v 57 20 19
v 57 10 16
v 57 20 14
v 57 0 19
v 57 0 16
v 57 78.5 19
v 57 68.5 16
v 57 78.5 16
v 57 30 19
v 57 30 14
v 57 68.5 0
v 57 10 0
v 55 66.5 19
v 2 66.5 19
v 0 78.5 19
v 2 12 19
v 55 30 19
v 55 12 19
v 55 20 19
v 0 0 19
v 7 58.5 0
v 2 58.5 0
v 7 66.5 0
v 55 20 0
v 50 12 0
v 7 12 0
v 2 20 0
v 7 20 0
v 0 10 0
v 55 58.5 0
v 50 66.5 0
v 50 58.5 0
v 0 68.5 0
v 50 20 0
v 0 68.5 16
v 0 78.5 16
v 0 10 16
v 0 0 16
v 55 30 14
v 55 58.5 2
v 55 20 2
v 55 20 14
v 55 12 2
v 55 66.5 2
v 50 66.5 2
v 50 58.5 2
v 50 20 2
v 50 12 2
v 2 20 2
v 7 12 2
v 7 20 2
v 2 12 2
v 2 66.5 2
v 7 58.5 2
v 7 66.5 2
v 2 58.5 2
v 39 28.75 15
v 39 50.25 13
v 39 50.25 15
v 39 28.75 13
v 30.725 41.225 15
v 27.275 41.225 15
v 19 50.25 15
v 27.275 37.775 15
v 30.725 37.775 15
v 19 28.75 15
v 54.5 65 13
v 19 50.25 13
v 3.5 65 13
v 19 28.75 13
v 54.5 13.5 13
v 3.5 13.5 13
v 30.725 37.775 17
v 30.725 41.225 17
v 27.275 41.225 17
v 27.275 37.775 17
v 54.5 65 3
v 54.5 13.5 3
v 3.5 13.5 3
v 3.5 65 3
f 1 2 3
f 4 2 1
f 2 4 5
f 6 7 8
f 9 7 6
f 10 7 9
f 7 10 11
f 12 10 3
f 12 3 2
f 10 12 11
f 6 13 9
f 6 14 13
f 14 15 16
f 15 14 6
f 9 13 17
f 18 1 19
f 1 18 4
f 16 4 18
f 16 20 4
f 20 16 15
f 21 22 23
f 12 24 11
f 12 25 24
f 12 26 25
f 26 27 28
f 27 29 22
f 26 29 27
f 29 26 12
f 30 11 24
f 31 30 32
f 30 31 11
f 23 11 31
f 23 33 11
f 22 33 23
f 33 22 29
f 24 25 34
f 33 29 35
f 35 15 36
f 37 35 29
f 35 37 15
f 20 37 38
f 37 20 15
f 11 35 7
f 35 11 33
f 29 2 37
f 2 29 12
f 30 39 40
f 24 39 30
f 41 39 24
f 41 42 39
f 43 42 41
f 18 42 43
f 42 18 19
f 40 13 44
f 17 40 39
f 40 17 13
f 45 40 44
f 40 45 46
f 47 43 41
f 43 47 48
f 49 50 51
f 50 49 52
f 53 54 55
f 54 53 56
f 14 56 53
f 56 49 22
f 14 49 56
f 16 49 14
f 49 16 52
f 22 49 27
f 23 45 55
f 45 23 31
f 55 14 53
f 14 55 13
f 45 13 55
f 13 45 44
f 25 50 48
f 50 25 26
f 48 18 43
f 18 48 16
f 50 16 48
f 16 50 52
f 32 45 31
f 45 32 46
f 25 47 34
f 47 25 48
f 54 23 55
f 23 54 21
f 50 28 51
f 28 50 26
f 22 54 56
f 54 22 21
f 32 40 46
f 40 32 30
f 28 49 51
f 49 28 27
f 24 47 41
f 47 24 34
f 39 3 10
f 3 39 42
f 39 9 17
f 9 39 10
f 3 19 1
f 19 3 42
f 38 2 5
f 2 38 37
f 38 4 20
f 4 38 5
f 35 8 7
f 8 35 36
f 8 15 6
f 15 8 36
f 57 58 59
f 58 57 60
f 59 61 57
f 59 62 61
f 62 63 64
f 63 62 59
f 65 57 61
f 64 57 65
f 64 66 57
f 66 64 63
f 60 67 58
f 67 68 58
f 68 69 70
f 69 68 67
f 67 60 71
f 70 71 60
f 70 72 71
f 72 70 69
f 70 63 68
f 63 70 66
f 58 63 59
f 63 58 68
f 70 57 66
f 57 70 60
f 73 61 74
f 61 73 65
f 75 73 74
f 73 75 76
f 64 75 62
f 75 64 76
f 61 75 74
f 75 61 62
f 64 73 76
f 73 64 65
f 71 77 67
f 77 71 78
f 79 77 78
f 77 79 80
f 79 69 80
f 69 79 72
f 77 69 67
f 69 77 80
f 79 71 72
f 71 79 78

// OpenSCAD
// file: modules_achetes.scad
$fn=75;

// LED: 2x3,45 / Pad: 20x21,5
module led(){
    color("blue")
    union(){
        cube([20,21.5,2]);
        translate([8.275,9.025,2]){
            cube([3.45,3.45,2]);
        }
    }
}

// Radiateur: 51x51,5x10
module radiateur(){
    color("purple") cube([51,51.5,10]);
}

// Ventilo: 30x30x10
module ventilateur(){
    union(){
    difference(){
        color("black") cube([40,40,10]);
        // Trous vis
        translate([4,4,-1]) cylinder(15,2,2);
        translate([40-4,4,-1]) cylinder(15,2,2);
        translate([4,40-4,-1]) cylinder(15,2,2);
        translate([40-4,40-4,-1]) cylinder(15,2,2);
    }
    // Centre
    translate([40/2,40/2,9]) color("lightgray") cylinder(2,1,1);
    }
}

module ledRadiateur(){
    radiateur();
    translate([25.5-10,25.75-10.5,10]){
        led();
    }
}

// Breadbord pour arduino (avec Arduino)
module bBoard(){
    /*
    // Big bBoard Cédric
    cube([125,57,9.8]);
    // Arduino
    translate([0,57/2-9,9.8]){
        cube([45,18,6]);
    }*/
    
    // bBoard 30 pins
    cube([85,57,9.8]);
    // Arduino
    translate([0,57/2-9,9.8]){
        cube([45,18,6]);
    }
}

// Modules d'alim Arduino + contôle ventilo
module moteurs(){
    difference(){
        cube([43.5,43.5,27]);
        // Trous vis
        translate([43.5-1.9-2,1.9+2,-1]) cylinder(30,2,2);
        translate([1.9+2,43.5-1.9-2,-1]) cylinder(30,2,2);
        translate([1.9+2,1.9+2,-1]) cylinder(30,2,2);
        translate([43.5-1.9-2,43.5-1.9-2,-1]) cylinder(30,2,2);
    }
}

// Abaisseur tension LED
module abaisseur(){
    difference(){
        cube([23,48,12.5]);
        // Trous vis
        translate([1.6+1,6+1,-1]) cylinder(15,2,2);
        translate([23-1.6-1,48-6-1,-1]) cylinder(15,2,2);
    }
}

module driverLed(){
    
}

module encodeur(){
    union(){
        // Bas
        cube([14,13.5,7]);
        // Haut
        translate([7,6.75,7]){
            cylinder(18,3.4,3.4);
        }
    }
}

module ecran(){
    difference(){
        union(){
            color("purple") cube([63.11,37.83,6.3]);
            translate([63.27/2-51.12/2,37.59/2-34.87/2,6.3]){
                color("green") cube([51.12,34.87,2]);
            }
        }
        // Trous vis
        translate([0.9+1.2,1.2+1.2,-1]){
            cylinder(10,1.2,1.2);
        }
        translate([63.27-0.9-1.2,1.2+1.2,-1]){
            cylinder(10,1.2,1.2);
        }
        translate([63.27-0.9-1.2,37.83-1.2-1.2,-1]){
            cylinder(10,1.2,1.2);
        }
        translate([0.9+1.2,37.83-1.2-1.2,-1]){
            cylinder(10,1.2,1.2);
        }
    }
}

/*ventilateur();
translate([-25.5+15,-25.75+15,15]){
    ledRadiateur();
}*/

//ventilateur();
//moteurs();
//ecran();
encodeur();

//bBoard();
// main file
use <modules_achetes.scad>

// 1 mm de marge pour mettre radiateur
module tiroir(){
    /*
    -= pattes pour rails
    -= faire passer câbles pour branchement LED
    -= contour avec soutien radiateur
    */
    
    long=58.5;
    larg=57;
    haut=19;
    
    union(){
        translate([0,10,0]){
            difference(){
                cube([larg,long,haut]);
                // Place radiateur
                translate([2,2,2]){
                    cube([larg-4,long-4,haut+2]);
                }
                // Croix
                translate([7,2,-1]){
                    cube([larg-6-8,long-4,5]);
                }
                translate([2,10,-1]){
                    cube([larg-4,long-20,5]);
                }
                // Trou câbles
                translate([long-7,10,haut-5]) cube([10,10,6]);
            }
        }
        // Pattes rails
        translate([0,0,haut-3]){
            cube([larg,10,3]);
        }
        translate([0,10+long,haut-3]){
            cube([larg,10,3]);
        }
    }
}


module tiroirPlein(){
    tiroir();
    // Radiateur: 51x51.5x10
    translate([3.5,13.5,3]){
        ledRadiateur();
    }
}

//rotate([180,0,0]) tiroir();
tiroirPlein();
